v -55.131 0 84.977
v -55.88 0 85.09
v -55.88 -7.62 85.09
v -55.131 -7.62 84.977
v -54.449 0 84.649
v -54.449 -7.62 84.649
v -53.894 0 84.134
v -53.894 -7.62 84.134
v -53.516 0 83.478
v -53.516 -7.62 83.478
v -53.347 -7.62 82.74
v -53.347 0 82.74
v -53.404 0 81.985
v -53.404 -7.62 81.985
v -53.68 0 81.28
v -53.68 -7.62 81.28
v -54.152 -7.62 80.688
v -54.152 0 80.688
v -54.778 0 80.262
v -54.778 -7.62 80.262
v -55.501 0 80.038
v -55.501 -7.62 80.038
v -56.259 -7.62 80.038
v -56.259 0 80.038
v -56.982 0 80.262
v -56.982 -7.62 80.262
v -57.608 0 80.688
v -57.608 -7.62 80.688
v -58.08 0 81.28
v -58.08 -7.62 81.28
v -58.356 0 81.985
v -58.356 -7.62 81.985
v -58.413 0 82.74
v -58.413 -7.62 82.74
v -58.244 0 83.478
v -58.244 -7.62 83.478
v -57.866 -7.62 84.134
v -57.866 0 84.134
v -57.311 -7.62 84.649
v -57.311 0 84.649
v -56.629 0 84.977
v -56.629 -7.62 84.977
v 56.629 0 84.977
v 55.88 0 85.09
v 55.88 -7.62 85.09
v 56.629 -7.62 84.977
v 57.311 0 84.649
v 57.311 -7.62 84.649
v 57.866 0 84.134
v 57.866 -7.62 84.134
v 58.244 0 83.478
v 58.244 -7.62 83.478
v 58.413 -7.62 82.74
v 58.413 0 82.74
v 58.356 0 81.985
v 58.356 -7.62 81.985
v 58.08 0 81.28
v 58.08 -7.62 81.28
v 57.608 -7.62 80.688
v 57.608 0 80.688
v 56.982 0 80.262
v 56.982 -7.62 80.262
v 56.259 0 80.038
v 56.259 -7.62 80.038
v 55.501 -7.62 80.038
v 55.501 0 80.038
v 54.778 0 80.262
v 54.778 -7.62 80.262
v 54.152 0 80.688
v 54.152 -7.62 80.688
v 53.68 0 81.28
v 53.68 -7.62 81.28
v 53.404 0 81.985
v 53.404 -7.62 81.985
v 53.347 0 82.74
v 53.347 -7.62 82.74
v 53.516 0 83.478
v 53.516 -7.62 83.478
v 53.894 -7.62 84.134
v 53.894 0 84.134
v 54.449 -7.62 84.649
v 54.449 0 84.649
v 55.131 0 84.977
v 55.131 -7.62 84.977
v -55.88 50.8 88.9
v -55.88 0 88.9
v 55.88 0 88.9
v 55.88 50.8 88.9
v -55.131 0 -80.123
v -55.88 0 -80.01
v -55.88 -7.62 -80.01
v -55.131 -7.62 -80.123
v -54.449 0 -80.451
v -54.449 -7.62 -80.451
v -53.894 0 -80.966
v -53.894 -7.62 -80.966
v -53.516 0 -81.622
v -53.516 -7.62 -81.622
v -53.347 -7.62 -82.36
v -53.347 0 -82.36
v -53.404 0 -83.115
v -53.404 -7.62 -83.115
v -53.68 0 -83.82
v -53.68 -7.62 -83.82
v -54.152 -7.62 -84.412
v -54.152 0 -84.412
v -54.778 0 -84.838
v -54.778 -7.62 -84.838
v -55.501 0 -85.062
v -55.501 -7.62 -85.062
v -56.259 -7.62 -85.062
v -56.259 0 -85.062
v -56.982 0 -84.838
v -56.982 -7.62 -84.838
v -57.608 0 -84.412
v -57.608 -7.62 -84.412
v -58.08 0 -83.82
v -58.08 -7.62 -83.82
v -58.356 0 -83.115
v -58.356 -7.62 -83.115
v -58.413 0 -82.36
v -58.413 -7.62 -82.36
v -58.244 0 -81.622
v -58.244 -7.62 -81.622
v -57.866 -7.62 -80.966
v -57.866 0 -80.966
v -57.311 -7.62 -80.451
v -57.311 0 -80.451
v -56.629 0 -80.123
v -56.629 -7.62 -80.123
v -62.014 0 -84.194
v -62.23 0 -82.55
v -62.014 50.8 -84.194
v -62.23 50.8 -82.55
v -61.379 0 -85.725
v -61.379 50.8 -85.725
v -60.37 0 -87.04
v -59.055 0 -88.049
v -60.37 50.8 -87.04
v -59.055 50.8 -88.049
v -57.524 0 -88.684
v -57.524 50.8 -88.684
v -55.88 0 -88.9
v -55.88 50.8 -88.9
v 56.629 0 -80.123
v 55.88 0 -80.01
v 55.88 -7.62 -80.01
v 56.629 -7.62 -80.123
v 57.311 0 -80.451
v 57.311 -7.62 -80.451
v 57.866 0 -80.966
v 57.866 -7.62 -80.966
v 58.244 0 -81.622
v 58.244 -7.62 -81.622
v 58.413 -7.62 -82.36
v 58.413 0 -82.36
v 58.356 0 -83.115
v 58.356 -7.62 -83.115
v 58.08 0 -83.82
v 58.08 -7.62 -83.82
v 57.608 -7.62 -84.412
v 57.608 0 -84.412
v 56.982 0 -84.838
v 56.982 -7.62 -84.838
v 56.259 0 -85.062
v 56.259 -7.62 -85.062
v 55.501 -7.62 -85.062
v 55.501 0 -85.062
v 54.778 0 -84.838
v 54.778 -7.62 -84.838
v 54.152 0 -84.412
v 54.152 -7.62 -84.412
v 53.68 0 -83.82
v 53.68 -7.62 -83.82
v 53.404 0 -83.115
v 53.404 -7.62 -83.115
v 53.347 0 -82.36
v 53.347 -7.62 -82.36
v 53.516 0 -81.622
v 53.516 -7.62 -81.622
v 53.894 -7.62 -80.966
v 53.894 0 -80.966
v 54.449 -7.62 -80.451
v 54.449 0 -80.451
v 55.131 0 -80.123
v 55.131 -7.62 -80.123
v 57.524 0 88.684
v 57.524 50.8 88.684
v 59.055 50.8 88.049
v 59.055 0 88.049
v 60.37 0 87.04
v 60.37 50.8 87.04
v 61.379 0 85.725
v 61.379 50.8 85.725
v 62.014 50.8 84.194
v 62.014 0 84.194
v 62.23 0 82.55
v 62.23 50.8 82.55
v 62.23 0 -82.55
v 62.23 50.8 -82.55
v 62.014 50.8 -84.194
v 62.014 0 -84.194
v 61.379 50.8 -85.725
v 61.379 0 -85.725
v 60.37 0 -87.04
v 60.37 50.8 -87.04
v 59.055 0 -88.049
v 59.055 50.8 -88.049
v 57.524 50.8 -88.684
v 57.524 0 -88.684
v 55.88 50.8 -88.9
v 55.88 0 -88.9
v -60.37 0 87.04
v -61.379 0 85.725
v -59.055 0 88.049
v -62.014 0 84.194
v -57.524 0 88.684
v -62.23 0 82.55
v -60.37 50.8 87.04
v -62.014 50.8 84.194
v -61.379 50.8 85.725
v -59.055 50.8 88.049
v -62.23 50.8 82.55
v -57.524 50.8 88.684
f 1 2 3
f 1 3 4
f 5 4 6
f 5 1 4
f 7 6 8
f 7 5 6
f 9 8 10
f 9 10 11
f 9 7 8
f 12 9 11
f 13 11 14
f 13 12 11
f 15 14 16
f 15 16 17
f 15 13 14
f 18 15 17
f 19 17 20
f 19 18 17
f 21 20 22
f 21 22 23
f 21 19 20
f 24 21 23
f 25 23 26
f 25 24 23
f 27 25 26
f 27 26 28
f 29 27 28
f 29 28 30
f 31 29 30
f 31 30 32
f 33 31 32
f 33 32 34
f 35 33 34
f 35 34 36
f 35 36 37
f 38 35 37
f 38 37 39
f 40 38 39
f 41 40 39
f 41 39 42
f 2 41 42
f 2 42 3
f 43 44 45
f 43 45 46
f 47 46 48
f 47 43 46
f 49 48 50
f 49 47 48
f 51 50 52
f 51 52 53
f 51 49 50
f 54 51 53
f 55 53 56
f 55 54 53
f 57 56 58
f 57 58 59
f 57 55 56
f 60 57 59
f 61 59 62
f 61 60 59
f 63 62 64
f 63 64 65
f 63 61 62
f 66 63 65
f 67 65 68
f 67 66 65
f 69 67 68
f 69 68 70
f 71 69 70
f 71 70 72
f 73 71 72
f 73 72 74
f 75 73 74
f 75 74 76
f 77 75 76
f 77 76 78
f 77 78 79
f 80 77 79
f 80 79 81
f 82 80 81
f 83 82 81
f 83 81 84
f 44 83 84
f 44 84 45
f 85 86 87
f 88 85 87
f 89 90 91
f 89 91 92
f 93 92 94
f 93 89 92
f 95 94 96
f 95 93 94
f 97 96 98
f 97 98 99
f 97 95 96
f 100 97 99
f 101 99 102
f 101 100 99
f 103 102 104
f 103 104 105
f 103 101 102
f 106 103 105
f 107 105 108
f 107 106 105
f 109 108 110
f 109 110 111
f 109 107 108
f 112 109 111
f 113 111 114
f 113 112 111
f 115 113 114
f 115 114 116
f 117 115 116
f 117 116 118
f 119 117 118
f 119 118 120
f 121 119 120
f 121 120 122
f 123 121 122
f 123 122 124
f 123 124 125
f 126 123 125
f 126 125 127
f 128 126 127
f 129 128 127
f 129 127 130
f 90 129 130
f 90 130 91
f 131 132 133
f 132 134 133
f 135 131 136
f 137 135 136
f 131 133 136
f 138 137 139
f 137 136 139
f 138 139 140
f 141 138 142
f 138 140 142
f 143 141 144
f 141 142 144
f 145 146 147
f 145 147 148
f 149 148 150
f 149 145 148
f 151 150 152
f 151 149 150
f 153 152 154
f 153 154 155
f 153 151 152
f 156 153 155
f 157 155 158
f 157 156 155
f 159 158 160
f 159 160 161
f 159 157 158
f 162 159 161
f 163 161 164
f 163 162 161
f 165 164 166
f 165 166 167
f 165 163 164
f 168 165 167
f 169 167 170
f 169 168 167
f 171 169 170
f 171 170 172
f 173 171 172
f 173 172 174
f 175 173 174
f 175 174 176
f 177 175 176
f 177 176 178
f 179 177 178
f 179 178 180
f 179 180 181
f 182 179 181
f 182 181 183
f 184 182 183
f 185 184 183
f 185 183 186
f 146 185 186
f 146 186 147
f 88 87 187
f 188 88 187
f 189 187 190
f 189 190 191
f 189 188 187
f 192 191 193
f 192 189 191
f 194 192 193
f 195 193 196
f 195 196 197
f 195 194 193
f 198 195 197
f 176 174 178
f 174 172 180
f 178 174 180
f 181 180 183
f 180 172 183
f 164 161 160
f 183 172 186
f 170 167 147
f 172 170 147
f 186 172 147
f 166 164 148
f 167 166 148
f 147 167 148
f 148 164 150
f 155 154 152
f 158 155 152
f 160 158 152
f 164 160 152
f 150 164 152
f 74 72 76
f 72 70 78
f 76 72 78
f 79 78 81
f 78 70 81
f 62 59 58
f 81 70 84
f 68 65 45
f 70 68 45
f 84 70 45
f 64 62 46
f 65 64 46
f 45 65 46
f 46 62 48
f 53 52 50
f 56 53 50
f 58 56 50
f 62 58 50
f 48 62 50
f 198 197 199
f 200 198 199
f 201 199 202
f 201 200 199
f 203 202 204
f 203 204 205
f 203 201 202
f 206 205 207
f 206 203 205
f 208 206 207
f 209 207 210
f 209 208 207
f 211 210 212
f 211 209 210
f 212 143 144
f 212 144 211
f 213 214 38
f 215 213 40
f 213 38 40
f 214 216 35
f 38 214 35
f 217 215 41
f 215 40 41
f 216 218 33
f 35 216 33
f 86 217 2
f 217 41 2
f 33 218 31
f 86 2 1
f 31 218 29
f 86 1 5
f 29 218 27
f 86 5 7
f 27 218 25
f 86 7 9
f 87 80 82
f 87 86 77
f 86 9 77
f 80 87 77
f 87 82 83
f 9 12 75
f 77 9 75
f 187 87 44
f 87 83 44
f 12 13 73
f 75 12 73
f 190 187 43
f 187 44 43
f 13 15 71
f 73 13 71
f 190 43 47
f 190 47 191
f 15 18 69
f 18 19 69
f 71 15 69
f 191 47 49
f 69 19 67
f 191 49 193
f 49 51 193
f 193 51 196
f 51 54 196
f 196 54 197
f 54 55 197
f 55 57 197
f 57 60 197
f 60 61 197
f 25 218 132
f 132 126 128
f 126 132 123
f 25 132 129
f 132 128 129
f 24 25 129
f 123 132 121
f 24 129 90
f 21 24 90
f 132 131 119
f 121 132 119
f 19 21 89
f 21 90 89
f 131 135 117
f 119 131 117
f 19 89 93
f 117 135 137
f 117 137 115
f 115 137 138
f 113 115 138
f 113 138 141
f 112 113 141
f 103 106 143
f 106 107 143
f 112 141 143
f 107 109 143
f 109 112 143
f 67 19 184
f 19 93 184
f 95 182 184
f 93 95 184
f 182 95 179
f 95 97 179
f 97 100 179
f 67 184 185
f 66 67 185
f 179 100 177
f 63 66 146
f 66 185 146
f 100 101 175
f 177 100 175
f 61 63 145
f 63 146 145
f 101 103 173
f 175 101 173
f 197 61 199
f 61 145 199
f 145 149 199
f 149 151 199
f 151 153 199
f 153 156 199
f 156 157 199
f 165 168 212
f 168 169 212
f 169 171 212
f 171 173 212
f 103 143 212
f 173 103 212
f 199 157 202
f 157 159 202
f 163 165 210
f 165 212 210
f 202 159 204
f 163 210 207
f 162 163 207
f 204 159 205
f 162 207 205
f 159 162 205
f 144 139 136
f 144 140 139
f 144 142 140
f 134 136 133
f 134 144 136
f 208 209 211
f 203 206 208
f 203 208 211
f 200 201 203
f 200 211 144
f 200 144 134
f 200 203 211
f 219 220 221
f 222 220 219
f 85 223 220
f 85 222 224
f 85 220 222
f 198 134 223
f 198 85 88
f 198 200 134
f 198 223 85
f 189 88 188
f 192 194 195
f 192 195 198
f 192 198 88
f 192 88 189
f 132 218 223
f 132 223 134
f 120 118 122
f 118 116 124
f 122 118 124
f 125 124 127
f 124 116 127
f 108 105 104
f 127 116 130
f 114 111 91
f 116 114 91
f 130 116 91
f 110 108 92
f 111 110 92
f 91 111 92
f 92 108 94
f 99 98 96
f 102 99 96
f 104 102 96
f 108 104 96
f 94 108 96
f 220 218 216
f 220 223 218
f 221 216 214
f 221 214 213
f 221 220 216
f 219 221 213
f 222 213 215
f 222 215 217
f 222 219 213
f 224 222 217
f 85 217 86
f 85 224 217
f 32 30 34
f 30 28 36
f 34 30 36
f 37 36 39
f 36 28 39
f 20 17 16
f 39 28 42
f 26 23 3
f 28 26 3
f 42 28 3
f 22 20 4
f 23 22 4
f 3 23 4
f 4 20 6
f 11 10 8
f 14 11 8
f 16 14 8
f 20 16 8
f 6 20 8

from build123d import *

# Parameters (mm, degrees)
SKETCH1_W           = 124.46
SKETCH1_H           = 177.8
BOSS_EXTRUDE1_DEPTH = 50.8
FILLET1_R           = 6.35
SKETCH3_R           = 2.54
BOSS_EXTRUDE2_DEPTH = 58.42


with BuildPart() as part:
    # Sketch1 → Boss-Extrude1 (new body)
    with BuildSketch(Plane(origin=(0, 0, 0), x_dir=(1, 0, 0), z_dir=(0, 1, 0))):
        Rectangle(SKETCH1_W, SKETCH1_H)
    extrude(amount=BOSS_EXTRUDE1_DEPTH)

    # Fillet1
    fillet1_edges = [part.edges().sort_by_distance(p)[0] for p in [
        (62.23, 25.4, 88.9),
        (-62.23, 25.4, 88.9),
        (-62.23, 25.4, -88.9),
        (62.23, 25.4, -88.9),
    ]]
    fillet(fillet1_edges, radius=FILLET1_R)

    # Sketch3 → Boss-Extrude2 (add)
    with BuildSketch(Plane(origin=(0, 50.8, 0), x_dir=(1, 0, 0), z_dir=(0, 1, 0))):
        with Locations(Location((-55.88, 82.55, 0), (0, 0, 270))):
            Circle(SKETCH3_R)
        with Locations(Location((55.88, 82.55, 0), (0, 0, 270))):
            Circle(SKETCH3_R)
        with Locations(Location((-55.88, -82.55, 0), (0, 0, 270))):
            Circle(SKETCH3_R)
        with Locations(Location((55.88, -82.55, 0), (0, 0, 270))):
            Circle(SKETCH3_R)
    extrude(amount=-BOSS_EXTRUDE2_DEPTH)


solid = part.part
